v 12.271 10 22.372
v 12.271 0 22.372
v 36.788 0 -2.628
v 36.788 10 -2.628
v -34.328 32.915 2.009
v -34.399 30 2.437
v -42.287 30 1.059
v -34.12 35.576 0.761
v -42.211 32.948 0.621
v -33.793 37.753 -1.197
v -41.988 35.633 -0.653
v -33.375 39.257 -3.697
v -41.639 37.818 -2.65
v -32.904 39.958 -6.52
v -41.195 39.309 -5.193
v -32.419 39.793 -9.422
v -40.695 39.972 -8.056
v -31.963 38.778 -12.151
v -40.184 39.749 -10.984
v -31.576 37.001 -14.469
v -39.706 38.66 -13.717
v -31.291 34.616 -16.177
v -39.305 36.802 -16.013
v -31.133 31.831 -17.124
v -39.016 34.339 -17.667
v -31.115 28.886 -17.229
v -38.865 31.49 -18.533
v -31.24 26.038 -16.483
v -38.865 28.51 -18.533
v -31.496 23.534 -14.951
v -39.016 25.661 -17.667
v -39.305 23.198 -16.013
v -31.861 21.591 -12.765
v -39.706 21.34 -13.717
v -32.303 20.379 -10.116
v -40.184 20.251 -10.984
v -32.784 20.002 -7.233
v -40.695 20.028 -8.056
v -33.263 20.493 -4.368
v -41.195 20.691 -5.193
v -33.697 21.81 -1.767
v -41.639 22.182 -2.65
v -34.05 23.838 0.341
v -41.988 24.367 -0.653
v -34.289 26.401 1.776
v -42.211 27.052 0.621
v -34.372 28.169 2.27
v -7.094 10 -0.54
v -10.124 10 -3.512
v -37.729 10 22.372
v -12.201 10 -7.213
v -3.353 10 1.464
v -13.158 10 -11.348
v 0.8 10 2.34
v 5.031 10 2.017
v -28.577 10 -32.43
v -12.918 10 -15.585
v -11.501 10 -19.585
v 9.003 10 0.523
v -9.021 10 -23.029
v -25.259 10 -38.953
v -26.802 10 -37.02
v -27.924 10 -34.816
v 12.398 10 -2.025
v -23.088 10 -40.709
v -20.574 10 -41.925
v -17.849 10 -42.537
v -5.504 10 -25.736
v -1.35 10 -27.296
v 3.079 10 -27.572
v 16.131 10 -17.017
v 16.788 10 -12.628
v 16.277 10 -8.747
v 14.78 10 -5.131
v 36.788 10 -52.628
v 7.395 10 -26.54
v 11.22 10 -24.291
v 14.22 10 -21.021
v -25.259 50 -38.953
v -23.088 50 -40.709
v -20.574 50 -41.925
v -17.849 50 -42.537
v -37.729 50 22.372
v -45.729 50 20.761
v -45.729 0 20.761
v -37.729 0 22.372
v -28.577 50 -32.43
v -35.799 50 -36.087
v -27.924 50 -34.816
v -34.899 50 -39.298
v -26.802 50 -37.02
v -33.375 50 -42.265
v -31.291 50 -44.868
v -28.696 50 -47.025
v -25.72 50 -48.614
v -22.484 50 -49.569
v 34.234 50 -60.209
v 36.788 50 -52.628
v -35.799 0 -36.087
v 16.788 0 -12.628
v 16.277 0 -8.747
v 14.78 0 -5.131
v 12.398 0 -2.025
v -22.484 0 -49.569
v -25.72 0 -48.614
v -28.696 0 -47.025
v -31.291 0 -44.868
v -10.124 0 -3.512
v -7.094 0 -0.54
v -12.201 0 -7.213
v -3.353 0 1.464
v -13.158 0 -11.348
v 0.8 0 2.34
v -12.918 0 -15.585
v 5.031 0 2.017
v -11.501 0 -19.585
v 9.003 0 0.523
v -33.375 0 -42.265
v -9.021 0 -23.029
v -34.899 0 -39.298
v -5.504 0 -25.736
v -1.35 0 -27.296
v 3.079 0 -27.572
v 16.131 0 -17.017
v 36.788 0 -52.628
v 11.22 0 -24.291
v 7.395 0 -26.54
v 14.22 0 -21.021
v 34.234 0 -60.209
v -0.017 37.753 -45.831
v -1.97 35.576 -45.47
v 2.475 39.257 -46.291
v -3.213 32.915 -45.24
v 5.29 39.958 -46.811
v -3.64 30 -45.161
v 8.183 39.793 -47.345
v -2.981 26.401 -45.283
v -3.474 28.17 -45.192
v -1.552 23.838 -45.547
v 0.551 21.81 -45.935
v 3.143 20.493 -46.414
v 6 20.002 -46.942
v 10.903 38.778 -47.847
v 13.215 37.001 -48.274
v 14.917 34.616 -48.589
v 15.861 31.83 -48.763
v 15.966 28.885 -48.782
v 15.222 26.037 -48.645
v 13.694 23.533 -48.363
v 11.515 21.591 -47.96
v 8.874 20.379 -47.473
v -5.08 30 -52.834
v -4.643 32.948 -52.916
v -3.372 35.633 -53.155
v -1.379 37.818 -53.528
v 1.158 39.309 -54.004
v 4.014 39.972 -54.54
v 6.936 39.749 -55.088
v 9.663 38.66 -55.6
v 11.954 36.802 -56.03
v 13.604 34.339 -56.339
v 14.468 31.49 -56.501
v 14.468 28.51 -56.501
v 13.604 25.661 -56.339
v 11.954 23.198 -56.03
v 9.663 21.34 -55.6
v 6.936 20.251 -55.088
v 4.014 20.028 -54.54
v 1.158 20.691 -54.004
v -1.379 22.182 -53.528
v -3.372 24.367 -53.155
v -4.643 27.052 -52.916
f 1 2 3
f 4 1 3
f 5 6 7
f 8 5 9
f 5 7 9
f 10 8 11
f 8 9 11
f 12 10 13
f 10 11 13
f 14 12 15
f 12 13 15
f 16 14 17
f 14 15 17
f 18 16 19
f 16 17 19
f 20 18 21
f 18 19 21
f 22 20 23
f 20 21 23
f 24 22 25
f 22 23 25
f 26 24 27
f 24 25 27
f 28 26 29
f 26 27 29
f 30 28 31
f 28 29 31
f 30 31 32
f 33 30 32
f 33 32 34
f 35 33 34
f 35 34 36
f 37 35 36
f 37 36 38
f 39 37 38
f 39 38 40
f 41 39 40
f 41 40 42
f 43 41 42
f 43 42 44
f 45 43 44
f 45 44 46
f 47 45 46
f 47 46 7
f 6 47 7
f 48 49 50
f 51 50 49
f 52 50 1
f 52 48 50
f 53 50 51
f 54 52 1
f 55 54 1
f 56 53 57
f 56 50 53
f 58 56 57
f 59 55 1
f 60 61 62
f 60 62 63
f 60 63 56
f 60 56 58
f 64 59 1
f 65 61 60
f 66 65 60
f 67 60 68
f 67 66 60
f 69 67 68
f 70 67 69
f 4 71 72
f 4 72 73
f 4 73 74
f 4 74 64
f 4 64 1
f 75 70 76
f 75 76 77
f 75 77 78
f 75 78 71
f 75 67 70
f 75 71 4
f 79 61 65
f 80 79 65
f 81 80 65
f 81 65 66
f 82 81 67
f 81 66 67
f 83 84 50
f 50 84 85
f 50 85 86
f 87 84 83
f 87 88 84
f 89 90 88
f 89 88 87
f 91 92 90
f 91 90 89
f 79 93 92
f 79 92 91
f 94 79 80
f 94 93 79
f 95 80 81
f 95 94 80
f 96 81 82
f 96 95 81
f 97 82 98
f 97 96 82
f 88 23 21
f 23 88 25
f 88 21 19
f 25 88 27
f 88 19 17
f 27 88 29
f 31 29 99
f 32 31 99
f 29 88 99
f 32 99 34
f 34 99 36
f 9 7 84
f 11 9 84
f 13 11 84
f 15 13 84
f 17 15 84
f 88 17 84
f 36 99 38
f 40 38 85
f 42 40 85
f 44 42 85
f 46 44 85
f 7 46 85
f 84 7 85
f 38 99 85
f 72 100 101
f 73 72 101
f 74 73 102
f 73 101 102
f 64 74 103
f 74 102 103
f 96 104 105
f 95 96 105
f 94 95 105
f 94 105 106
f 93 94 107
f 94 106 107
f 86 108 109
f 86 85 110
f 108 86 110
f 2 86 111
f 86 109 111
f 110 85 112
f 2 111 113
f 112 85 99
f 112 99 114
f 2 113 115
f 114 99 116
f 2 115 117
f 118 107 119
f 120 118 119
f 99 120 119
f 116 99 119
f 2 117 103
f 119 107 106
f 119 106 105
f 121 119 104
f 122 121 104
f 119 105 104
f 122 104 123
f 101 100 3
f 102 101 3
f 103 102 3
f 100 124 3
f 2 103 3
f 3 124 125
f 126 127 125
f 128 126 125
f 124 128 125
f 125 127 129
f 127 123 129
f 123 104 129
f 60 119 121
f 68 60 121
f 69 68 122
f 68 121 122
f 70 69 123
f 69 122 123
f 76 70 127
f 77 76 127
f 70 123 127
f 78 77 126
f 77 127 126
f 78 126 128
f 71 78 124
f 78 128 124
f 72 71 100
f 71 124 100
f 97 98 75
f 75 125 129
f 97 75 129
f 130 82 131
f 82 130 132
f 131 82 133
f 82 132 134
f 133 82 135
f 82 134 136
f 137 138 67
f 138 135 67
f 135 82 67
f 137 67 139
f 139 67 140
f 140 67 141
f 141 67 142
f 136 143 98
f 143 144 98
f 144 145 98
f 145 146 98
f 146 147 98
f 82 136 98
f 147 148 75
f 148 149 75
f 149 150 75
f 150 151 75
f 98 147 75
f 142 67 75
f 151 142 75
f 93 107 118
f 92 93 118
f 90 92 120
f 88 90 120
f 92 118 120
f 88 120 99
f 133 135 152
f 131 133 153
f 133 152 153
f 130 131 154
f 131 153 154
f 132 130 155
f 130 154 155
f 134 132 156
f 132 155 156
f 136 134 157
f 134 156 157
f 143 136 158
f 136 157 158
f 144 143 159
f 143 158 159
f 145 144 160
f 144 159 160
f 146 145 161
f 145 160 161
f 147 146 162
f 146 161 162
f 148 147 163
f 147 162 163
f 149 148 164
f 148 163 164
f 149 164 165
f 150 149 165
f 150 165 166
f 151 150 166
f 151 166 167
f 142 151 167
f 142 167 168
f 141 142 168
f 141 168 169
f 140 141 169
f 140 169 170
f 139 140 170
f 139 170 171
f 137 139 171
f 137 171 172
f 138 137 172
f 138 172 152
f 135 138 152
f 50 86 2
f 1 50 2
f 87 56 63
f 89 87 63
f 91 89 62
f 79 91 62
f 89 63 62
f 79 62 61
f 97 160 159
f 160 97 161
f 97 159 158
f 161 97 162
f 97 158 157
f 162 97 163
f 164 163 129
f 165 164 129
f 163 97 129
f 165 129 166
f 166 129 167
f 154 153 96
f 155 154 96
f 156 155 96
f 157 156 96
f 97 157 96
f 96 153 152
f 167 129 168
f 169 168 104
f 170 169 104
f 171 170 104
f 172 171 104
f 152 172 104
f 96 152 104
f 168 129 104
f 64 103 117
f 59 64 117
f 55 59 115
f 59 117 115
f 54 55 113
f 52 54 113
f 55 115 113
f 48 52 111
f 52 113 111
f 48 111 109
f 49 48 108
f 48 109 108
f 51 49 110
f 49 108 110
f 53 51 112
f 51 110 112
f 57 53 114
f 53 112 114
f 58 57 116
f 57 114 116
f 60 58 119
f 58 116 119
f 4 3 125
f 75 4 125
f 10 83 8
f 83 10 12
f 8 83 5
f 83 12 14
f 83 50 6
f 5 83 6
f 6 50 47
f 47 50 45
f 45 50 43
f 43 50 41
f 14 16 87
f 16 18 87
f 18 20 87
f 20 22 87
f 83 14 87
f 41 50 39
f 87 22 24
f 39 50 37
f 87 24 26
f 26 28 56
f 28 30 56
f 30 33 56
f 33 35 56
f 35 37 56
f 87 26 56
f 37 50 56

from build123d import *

# Parameters (mm, degrees)
SKETCH_1_R          = 15
EXTRUDE_1_DEPTH     = 10
EXTRUDE_2_DEPTH     = 50
SKETCH_3_R          = 10
CUT_EXTRUDE_1_DEPTH = 107.514235114
SKETCH_4_R          = 10
CUT_EXTRUDE_2_DEPTH = 101.948347169


with BuildPart() as part:
    # 草图1 → 凸台-拉伸1 (new body)
    with BuildSketch(Plane(origin=(0, 0, 0), x_dir=(1, 0, 0), z_dir=(0, 1, 0))):
        with BuildLine():
            Line((-28.57662693, 32.430036501), (-37.728647462, -22.372159091))
            Line((-37.728647462, -22.372159091), (12.271352538, -22.372159091))
            Line((12.271352538, -22.372159091), (36.78772041, 2.627840909))
            Line((36.78772041, 2.627840909), (36.78772041, 52.627840909))
            Line((36.78772041, 52.627840909), (-17.849431841, 42.537166231))
            ThreePointArc((-17.849431841, 42.537166231), (-24.914908418, 39.289889491), (-28.57662693, 32.430036501))
        make_face()
        with Locations((1.78772041, 12.627840909)):
            Circle(SKETCH_1_R, mode=Mode.SUBTRACT)
    extrude(amount=EXTRUDE_1_DEPTH)

    # 草图1<3> → 凸台-拉伸2 (add)
    with BuildSketch(Plane(origin=(0, 0, 0), x_dir=(1, 0, 0), z_dir=(0, 1, 0))):
        with BuildLine():
            Line((-45.728647462, -20.760800889), (-37.728647462, -22.372159091))
            Line((-37.728647462, -22.372159091), (-28.57662693, 32.430036501))
            ThreePointArc((-28.57662693, 32.430036501), (-24.914908418, 39.289889491), (-17.849431841, 42.537166231))
            Line((-17.849431841, 42.537166231), (36.78772041, 52.627840909))
            Line((36.78772041, 52.627840909), (34.234475122, 60.209459371))
            Line((34.234475122, 60.209459371), (-22.484150231, 49.56919577))
            ThreePointArc((-22.484150231, 49.56919577), (-31.249928384, 44.909957788), (-35.799091446, 36.086552513))
            Line((-35.799091446, 36.086552513), (-45.728647462, -20.760800889))
        make_face()
    extrude(amount=EXTRUDE_2_DEPTH)

    # 草图3 → 切除-拉伸1 (cut, through all)
    with BuildSketch(Plane(origin=(-40.855844778, 0, -7.136311104), x_dir=(-0.17206538860383633, 0, 0.9850855303193783), z_dir=(-0.9850855303193784, 0, -0.17206538860383633))):
        with Locations((-1.680517951, 30)):
            Circle(SKETCH_3_R)
    extrude(amount=-CUT_EXTRUDE_1_DEPTH, mode=Mode.SUBTRACT)

    # 草图4 → 切除-拉伸2 (cut, through all)
    with BuildSketch(Plane(origin=(-9.747294738, 0, -51.95859606), x_dir=(-0.9828548523659901, 0, 0.18438096208835575), z_dir=(-0.18438096208835575, 0, -0.9828548523659901))):
        with Locations((-14.748998038, 30)):
            Circle(SKETCH_4_R)
    extrude(amount=-CUT_EXTRUDE_2_DEPTH, mode=Mode.SUBTRACT)


solid = part.part
